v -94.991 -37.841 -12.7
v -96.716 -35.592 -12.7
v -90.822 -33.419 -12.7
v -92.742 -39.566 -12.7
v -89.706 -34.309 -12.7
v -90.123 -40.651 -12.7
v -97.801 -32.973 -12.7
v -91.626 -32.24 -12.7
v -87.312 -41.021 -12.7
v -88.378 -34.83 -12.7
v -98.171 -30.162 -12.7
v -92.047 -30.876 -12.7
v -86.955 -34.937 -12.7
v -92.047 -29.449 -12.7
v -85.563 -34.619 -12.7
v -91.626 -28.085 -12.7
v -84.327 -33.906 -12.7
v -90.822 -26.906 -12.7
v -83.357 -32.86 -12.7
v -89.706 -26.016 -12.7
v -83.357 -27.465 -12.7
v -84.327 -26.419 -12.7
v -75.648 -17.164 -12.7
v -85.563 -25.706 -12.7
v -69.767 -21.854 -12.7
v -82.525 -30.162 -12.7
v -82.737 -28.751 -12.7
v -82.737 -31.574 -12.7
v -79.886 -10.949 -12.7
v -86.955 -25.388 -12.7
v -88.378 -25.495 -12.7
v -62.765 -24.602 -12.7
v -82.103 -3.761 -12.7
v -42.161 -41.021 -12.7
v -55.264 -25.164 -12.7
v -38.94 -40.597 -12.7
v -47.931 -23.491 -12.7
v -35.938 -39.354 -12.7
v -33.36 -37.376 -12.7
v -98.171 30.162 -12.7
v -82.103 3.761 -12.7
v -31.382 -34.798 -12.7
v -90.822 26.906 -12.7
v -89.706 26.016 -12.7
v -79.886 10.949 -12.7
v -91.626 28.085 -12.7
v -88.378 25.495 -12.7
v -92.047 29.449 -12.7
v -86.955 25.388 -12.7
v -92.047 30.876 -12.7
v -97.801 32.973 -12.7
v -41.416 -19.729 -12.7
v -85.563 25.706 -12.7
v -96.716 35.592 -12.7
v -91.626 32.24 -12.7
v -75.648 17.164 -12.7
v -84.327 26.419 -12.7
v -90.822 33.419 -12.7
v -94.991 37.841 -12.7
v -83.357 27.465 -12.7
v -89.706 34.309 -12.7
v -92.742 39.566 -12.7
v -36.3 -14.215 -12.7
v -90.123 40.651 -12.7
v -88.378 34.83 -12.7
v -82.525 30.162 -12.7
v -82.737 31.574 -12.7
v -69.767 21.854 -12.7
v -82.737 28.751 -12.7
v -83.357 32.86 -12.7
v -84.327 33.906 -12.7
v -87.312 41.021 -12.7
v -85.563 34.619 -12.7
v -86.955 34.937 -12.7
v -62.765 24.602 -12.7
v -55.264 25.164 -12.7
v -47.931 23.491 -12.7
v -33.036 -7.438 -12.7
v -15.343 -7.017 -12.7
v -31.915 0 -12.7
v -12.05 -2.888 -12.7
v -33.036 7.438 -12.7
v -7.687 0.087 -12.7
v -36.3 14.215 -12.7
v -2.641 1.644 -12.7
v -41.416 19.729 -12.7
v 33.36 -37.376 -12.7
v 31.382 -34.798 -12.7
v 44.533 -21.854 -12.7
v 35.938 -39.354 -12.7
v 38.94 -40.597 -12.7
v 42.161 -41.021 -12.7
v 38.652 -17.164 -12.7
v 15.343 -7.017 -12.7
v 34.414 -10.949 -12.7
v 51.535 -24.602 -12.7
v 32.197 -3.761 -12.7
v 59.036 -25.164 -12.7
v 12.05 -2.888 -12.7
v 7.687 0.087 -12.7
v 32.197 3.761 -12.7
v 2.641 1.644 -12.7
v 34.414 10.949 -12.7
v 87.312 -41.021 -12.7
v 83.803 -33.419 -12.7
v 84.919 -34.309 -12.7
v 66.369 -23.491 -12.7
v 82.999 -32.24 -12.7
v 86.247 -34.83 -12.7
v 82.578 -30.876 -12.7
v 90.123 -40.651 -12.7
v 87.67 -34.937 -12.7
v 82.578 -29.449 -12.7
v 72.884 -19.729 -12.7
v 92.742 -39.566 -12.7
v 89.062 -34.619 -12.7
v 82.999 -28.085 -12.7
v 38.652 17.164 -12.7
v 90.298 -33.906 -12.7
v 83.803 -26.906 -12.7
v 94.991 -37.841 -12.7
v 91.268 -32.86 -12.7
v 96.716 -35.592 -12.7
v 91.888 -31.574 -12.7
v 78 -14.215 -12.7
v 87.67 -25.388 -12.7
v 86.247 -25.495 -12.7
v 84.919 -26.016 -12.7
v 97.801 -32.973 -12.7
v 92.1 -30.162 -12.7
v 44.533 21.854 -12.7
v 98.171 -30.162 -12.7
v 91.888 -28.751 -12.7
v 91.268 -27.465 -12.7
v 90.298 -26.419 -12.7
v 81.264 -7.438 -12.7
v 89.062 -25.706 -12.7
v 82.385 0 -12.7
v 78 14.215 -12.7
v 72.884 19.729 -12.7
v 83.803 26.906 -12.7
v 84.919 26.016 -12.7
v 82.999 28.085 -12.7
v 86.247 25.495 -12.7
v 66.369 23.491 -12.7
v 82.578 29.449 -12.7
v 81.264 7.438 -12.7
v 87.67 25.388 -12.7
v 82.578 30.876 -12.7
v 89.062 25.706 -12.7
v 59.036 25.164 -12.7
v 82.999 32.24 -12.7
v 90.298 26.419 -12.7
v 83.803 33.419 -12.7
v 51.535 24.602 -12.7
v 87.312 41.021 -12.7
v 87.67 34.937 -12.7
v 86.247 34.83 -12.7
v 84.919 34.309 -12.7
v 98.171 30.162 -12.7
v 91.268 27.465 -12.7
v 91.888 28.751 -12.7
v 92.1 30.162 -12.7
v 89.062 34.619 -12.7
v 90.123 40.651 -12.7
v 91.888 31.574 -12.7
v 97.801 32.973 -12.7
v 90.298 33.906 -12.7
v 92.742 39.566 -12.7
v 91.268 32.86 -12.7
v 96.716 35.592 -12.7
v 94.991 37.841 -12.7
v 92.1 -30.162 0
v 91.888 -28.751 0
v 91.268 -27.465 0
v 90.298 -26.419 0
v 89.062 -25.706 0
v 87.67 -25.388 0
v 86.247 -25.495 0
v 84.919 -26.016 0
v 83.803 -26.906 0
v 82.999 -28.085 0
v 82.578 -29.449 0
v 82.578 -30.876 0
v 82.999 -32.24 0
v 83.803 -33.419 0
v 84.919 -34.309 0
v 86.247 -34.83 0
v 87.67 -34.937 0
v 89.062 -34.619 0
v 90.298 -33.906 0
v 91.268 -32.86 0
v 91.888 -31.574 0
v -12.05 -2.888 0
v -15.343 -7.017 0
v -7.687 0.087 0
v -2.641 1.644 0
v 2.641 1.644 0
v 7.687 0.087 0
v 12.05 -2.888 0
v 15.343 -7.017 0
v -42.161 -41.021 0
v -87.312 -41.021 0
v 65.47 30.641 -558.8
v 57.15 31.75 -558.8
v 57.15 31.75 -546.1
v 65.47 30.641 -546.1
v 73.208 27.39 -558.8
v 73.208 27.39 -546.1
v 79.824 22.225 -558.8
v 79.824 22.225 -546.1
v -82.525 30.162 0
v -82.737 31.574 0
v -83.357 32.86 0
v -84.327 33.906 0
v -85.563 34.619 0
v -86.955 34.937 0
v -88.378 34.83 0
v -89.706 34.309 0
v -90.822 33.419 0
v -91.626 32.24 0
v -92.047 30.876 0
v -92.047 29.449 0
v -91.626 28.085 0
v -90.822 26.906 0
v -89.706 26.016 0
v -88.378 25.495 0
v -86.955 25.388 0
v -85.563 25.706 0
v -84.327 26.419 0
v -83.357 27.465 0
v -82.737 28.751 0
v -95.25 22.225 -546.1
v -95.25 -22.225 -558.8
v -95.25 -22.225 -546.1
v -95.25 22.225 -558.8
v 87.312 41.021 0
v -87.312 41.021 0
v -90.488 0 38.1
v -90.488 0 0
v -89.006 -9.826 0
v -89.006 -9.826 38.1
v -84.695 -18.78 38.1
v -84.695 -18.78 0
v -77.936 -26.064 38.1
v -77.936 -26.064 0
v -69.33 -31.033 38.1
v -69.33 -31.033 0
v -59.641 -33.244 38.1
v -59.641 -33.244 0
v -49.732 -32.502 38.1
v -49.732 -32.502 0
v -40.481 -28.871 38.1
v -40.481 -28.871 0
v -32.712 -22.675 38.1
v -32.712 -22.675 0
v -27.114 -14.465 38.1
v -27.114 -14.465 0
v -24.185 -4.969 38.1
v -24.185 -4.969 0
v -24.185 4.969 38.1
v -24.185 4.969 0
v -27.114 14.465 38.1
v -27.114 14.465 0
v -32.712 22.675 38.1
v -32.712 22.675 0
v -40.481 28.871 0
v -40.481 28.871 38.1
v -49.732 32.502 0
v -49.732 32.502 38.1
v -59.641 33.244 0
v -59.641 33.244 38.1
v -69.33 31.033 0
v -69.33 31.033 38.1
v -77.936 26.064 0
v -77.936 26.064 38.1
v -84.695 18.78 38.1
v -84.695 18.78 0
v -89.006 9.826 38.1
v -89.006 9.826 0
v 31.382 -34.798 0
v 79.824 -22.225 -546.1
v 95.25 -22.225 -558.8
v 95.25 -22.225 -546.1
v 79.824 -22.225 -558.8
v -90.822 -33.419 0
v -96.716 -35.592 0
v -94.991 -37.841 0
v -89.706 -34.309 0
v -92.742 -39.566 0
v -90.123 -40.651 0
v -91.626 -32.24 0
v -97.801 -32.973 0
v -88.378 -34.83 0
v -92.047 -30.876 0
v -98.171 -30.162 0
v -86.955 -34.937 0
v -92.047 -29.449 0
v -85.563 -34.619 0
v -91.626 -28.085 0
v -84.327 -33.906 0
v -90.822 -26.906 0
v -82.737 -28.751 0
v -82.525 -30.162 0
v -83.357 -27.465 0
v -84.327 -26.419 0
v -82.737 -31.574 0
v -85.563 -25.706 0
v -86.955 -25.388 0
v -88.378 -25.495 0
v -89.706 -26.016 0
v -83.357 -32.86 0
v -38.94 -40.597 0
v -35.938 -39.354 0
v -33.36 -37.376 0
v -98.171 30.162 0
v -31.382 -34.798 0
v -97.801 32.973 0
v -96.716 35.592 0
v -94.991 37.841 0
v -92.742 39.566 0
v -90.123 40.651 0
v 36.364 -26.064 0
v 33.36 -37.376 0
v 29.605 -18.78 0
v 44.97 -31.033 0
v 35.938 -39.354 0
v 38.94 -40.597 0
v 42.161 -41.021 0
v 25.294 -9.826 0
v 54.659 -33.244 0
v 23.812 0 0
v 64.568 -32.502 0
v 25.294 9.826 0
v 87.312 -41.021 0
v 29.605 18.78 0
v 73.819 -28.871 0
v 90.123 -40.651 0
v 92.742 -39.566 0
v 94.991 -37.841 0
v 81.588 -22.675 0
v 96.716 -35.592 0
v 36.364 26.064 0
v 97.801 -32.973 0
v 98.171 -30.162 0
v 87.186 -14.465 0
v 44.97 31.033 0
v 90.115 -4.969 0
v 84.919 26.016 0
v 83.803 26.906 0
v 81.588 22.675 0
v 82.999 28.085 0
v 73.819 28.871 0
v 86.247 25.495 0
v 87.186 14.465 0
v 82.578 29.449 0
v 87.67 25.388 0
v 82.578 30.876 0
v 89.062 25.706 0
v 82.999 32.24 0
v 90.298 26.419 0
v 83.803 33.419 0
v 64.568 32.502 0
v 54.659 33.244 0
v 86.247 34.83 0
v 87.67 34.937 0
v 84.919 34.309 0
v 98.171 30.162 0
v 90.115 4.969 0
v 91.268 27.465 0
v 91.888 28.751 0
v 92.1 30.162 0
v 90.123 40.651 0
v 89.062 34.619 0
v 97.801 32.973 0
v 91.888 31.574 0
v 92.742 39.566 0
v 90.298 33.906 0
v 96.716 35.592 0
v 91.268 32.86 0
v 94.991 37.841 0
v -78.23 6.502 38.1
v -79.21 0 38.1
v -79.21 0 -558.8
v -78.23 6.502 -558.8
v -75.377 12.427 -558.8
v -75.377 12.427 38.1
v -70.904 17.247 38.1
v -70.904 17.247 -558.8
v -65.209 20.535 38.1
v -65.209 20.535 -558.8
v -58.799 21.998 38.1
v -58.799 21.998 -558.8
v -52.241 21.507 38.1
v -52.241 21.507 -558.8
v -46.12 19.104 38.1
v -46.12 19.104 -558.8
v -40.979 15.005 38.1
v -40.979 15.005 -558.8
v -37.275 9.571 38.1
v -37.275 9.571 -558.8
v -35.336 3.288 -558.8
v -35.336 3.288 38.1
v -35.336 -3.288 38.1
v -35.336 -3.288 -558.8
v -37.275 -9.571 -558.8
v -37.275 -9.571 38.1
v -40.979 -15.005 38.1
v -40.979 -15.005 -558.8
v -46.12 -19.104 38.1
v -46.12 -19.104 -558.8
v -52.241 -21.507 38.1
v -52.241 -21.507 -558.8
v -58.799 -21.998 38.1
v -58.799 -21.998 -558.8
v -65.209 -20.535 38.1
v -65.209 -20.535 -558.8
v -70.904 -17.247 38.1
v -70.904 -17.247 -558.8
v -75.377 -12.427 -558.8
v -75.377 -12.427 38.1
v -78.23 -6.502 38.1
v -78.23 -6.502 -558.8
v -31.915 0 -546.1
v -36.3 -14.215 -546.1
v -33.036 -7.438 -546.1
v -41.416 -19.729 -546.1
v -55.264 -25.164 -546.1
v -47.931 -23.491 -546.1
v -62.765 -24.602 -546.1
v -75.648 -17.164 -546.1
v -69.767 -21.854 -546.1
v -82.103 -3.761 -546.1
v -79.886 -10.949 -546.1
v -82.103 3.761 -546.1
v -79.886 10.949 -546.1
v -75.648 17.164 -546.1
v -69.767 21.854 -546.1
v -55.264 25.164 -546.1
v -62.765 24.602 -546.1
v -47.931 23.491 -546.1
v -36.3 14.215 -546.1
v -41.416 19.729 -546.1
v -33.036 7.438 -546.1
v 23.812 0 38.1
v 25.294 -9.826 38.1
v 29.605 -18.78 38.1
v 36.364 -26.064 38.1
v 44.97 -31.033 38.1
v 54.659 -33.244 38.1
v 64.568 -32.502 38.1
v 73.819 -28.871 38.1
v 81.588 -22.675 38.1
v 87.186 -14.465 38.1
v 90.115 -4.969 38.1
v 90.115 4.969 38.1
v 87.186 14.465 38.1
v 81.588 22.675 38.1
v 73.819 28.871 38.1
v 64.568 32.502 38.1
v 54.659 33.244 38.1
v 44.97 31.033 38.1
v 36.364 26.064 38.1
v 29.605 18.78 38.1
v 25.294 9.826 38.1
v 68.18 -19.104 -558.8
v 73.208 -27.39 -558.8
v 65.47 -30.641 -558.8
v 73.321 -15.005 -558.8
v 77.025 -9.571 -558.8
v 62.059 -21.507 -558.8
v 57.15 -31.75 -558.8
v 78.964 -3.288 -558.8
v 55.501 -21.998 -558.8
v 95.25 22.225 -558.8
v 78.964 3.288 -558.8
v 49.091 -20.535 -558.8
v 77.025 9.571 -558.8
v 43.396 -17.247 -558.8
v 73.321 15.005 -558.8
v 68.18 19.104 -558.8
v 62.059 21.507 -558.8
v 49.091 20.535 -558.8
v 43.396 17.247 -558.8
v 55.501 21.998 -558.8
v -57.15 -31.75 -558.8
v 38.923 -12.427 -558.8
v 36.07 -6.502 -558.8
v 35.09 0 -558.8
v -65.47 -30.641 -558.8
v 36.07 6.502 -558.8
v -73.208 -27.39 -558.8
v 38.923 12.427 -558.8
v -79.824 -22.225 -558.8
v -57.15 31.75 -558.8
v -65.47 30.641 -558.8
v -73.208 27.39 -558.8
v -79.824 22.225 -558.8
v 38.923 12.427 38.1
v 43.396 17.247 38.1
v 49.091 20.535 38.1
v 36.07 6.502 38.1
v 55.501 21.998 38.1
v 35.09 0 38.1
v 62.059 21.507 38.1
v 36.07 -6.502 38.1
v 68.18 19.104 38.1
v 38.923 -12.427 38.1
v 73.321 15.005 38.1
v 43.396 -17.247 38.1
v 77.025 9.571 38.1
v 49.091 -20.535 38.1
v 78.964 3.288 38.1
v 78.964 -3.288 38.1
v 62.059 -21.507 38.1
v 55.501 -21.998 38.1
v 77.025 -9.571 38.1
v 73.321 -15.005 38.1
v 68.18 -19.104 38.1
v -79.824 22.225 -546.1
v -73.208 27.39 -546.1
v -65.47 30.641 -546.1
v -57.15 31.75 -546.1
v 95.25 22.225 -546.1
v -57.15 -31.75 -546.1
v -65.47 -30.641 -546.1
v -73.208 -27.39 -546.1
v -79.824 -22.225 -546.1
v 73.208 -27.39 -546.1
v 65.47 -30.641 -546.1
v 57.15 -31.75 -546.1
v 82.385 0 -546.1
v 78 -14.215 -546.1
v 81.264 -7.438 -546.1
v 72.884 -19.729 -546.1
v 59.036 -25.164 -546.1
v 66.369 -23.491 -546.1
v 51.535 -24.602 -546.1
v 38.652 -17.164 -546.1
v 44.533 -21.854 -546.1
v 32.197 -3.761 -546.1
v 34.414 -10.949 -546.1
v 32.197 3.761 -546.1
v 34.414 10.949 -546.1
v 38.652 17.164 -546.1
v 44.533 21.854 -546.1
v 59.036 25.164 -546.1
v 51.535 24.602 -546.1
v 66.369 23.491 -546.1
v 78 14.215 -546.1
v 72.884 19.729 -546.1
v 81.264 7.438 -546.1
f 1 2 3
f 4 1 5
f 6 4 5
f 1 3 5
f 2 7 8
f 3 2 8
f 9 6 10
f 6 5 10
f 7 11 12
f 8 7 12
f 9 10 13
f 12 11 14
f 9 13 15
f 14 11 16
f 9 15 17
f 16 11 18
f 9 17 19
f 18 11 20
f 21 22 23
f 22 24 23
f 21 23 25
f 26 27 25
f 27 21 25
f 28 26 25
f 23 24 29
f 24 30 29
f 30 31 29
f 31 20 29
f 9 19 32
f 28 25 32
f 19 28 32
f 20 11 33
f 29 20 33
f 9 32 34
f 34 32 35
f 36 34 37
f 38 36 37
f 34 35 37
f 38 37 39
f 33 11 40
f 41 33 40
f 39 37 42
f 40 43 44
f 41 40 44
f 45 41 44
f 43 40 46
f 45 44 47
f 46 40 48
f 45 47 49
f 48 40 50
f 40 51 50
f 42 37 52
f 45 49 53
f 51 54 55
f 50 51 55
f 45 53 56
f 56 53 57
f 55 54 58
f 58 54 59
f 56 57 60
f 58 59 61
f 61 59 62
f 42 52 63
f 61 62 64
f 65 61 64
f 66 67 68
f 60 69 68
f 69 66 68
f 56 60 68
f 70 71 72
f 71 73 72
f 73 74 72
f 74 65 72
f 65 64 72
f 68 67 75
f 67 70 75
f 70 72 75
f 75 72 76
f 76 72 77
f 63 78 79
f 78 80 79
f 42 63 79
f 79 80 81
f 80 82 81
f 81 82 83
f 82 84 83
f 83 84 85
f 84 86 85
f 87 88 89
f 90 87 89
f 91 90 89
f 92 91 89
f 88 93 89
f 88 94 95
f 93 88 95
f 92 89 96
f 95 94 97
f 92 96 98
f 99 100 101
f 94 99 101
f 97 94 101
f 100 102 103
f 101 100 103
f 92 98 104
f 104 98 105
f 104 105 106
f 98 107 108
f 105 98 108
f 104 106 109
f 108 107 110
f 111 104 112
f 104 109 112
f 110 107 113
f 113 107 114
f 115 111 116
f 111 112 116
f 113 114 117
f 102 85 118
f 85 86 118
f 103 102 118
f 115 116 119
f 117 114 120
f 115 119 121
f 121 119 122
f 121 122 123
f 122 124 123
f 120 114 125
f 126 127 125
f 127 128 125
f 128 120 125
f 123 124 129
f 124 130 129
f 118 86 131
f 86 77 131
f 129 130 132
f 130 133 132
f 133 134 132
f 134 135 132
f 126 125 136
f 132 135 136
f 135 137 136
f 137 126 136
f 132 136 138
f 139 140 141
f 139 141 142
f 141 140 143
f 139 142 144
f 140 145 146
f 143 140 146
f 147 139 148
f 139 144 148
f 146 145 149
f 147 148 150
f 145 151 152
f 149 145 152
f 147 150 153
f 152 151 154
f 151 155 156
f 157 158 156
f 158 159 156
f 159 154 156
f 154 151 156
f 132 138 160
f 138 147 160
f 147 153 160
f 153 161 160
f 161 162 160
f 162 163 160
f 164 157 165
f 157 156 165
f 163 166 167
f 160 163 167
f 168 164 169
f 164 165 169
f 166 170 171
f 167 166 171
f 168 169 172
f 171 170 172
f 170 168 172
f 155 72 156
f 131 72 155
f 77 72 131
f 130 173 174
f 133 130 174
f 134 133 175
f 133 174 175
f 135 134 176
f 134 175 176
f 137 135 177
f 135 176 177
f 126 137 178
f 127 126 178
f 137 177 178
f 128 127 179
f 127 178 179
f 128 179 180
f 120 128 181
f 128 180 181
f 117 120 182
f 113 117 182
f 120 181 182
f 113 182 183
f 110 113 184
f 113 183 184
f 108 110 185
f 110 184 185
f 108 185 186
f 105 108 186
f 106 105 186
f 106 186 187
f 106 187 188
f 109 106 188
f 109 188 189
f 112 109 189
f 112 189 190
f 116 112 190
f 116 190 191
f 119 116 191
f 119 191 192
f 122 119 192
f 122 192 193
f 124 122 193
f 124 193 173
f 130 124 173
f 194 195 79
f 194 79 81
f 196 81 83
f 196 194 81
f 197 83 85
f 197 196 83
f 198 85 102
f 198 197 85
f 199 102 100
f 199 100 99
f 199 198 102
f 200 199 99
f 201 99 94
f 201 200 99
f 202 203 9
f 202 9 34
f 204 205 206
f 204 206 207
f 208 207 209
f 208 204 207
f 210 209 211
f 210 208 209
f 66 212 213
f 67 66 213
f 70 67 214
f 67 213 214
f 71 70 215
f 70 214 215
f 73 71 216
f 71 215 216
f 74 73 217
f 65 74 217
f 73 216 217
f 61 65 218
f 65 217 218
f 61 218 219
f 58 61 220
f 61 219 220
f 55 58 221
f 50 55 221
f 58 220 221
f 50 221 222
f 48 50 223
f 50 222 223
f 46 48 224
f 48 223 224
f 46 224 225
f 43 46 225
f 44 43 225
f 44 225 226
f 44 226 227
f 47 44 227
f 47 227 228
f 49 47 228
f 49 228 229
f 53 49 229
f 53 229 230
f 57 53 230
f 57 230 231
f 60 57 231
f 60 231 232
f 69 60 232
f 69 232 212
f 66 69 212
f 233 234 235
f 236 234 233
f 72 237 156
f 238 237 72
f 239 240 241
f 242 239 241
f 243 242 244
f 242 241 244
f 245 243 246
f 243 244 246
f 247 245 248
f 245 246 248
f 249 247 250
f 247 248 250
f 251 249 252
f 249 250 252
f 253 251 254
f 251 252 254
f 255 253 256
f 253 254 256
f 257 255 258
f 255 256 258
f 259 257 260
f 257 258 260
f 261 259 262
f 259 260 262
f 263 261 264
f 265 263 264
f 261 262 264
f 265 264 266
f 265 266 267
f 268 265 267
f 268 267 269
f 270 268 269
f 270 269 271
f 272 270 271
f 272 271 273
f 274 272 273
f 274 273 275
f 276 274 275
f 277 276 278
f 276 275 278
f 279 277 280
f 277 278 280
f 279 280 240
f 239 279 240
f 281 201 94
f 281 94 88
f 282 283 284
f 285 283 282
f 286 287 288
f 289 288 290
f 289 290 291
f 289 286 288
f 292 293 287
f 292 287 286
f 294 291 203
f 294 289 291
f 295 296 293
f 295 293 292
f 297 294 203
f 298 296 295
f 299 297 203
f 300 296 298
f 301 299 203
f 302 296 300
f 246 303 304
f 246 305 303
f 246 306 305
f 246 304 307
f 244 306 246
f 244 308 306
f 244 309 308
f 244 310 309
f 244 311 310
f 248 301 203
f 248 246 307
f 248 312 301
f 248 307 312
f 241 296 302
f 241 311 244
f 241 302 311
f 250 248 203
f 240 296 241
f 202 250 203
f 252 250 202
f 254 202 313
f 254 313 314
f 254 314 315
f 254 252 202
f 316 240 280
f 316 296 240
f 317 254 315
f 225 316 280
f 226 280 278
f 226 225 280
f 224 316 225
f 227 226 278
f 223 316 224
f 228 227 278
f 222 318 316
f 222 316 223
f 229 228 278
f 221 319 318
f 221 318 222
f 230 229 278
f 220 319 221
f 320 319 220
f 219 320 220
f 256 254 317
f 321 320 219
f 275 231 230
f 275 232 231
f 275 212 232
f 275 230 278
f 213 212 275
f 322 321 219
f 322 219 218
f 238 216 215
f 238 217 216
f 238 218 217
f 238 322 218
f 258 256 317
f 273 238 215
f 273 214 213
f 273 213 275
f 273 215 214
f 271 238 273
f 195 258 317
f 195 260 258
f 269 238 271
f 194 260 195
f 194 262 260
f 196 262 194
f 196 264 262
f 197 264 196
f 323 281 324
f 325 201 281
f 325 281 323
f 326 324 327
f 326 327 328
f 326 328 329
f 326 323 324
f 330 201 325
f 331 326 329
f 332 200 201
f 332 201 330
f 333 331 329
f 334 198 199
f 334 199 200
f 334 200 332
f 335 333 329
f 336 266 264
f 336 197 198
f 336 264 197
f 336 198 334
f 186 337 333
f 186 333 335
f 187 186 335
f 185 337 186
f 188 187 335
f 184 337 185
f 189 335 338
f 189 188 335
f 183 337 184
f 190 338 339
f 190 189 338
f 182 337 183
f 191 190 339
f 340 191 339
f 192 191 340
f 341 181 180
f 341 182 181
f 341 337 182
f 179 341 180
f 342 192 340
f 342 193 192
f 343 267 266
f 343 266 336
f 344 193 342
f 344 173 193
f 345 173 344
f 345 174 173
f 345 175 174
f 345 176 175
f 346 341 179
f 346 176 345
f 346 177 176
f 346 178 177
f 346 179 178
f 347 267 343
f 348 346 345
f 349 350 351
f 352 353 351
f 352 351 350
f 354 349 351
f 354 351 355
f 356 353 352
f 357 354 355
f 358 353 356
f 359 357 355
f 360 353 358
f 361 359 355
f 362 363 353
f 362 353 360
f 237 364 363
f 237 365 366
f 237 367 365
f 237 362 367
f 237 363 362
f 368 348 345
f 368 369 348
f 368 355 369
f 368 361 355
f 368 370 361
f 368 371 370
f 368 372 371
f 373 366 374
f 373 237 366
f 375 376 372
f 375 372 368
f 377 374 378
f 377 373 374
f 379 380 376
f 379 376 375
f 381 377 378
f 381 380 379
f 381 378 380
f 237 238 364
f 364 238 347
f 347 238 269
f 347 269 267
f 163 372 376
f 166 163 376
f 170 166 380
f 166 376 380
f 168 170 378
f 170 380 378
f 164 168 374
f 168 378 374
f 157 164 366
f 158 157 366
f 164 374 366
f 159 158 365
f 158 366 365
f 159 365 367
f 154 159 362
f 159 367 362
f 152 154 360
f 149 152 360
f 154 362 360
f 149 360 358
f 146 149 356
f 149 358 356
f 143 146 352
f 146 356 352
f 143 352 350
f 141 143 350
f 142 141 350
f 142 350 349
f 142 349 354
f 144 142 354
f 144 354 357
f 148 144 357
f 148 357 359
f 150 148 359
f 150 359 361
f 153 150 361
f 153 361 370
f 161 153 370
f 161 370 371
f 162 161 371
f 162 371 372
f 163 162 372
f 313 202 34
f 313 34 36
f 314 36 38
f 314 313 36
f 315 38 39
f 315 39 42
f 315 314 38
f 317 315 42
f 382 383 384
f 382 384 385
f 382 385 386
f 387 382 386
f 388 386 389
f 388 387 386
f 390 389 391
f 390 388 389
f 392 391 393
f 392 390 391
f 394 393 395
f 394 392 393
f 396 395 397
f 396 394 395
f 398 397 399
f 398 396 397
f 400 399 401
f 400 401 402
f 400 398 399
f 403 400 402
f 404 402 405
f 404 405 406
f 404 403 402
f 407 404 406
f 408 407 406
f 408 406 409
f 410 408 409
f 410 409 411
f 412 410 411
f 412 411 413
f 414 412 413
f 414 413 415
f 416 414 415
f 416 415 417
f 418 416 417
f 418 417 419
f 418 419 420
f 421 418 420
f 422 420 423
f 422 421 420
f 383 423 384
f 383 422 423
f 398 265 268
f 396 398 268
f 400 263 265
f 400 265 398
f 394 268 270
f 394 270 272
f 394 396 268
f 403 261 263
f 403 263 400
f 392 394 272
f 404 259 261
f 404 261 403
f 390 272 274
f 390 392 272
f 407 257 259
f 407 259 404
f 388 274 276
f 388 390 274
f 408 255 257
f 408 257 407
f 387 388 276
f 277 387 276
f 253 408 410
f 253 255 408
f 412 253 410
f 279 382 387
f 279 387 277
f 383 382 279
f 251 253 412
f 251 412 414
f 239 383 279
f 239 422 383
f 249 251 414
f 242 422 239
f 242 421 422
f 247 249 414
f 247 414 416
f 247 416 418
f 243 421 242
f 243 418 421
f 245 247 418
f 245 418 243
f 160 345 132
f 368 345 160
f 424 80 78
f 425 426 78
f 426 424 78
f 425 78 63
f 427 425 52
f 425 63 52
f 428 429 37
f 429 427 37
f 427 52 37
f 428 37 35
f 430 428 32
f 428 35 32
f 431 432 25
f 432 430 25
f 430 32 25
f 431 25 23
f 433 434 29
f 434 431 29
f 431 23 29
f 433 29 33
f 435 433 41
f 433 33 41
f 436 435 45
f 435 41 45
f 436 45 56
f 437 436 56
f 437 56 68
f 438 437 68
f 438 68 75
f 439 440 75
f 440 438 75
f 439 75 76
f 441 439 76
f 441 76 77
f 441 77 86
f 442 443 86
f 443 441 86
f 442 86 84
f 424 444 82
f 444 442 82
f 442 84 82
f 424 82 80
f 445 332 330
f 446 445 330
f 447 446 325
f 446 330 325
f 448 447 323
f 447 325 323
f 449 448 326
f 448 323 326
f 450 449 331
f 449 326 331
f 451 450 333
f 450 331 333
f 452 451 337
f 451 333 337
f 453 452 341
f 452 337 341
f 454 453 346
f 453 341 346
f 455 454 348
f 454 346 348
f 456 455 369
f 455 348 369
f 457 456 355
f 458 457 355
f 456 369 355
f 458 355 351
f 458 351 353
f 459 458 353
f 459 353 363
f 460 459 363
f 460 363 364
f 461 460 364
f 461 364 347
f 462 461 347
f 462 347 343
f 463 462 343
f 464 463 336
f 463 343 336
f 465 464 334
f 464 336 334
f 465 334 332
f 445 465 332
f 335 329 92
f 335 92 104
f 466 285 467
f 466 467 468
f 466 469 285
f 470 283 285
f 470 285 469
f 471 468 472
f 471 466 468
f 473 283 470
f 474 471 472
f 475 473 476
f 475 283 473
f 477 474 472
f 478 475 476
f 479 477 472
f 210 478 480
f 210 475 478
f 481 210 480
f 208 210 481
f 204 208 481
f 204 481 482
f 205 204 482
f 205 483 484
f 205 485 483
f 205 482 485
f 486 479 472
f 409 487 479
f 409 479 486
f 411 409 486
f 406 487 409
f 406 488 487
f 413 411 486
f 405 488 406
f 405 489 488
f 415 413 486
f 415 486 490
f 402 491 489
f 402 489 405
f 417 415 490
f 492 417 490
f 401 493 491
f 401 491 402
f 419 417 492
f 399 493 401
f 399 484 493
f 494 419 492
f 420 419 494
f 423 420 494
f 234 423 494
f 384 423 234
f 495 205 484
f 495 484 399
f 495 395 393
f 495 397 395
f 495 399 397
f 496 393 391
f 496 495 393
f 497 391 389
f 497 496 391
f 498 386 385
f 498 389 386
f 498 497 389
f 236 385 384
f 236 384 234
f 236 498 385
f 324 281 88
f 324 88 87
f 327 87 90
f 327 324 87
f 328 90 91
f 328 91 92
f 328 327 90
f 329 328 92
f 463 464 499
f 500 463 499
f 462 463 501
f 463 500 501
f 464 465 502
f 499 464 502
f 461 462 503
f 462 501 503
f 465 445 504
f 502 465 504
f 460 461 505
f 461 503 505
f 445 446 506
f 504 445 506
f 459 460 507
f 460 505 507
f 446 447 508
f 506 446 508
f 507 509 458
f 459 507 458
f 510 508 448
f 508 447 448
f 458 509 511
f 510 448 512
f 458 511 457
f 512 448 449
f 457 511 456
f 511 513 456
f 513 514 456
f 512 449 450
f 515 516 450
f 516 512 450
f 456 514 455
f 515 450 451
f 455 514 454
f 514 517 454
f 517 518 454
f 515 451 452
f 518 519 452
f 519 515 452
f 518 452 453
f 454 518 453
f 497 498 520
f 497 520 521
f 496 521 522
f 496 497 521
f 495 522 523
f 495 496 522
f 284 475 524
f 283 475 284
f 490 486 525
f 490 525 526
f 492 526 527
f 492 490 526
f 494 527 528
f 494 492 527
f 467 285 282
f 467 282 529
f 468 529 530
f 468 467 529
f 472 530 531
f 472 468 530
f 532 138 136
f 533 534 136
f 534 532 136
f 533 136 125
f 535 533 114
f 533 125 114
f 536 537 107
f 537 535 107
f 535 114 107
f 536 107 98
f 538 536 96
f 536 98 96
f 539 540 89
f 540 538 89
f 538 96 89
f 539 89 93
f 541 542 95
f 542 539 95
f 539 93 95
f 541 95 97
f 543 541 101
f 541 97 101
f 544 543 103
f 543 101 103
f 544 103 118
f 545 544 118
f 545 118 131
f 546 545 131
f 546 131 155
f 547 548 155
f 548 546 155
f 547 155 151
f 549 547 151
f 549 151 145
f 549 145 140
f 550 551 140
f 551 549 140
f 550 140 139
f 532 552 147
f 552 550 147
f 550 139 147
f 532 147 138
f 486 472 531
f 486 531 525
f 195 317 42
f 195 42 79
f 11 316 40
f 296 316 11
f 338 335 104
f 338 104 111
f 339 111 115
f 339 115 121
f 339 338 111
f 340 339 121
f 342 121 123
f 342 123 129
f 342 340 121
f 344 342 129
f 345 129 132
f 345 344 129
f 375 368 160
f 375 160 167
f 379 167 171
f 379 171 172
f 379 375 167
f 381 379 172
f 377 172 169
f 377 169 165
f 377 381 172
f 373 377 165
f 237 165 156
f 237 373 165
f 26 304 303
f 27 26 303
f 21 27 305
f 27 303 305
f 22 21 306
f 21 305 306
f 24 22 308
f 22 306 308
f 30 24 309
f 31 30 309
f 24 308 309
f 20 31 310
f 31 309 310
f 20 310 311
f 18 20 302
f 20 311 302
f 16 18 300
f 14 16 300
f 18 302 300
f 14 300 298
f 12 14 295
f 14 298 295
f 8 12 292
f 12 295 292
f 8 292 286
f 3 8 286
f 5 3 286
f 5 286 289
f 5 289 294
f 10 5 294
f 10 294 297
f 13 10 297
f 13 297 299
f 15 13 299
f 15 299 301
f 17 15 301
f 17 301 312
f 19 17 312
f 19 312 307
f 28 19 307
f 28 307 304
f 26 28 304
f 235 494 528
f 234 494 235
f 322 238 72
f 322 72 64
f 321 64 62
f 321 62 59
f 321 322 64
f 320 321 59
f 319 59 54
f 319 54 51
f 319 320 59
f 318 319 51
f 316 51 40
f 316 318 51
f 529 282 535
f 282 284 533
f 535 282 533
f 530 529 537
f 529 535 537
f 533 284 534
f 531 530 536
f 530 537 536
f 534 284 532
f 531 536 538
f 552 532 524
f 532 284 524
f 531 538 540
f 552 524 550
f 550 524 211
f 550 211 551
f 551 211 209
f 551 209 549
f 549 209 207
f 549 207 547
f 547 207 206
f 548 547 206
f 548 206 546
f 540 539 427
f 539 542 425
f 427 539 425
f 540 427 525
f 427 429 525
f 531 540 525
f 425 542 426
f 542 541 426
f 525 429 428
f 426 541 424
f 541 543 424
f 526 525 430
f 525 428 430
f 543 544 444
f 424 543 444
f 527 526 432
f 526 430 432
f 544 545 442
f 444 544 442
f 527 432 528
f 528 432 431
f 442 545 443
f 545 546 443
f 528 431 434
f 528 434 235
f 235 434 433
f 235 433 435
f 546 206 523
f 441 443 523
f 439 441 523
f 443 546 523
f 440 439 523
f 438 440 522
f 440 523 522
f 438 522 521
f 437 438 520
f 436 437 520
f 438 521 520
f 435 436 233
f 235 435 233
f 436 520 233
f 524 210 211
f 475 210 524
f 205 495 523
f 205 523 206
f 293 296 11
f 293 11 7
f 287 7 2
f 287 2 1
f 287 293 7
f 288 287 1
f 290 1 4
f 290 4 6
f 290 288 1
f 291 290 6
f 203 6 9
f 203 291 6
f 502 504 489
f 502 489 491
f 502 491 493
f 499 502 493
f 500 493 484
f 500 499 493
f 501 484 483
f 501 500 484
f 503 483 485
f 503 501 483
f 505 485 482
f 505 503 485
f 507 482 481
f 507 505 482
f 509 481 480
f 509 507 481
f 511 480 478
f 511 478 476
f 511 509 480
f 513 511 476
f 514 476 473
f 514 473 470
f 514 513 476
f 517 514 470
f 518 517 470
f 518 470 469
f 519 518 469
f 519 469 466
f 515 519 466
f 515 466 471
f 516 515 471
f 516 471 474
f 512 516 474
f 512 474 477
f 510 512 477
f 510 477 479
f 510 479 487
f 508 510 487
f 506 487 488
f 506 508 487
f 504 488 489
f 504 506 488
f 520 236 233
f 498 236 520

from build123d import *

# Parameters (mm, degrees)
EXTRUDE1_DEPTH      = 12.7
SKETCH27_R          = 33.3375
EXTRUDE3_DEPTH      = 38.1
SKETCH29_R          = 4.7879
SKETCH29_R_2        = 25.2349
CUT_EXTRUDE5_DEPTH  = 50.8
SKETCH41_R          = 25.2349
SKETCH41_R_2        = 22.0599
BOSS_EXTRUDE1_DEPTH = 596.9
SKETCH42_R          = 22.5679
BOSS_EXTRUDE2_DEPTH = 12.7


with BuildPart() as part:
    # Sketch1 → Extrude1 (new body)
    with BuildSketch(Plane.XY):
        with BuildLine():
            Line((-98.171, 30.1625), (-98.171, -30.1625))
            ThreePointArc((-98.171, -30.1625), (-94.990618984, -37.840618984), (-87.3125, -41.021))
            Line((-87.3125, -41.021), (-42.161003408, -41.021))
            ThreePointArc((-42.161003408, -41.021), (-35.938003408, -39.353552176), (-31.382451232, -34.798))
            Line((-31.382451232, -34.798), (-15.342939066, -7.01675))
            ThreePointArc((-15.342939066, -7.01675), (0, 1.8415), (15.342939066, -7.01675))
            Line((15.342939066, -7.01675), (31.382451232, -34.798))
            ThreePointArc((31.382451232, -34.798), (35.938003408, -39.353552176), (42.161003408, -41.021))
            Line((42.161003408, -41.021), (87.3125, -41.021))
            ThreePointArc((87.3125, -41.021), (94.990618984, -37.840618984), (98.171, -30.1625))
            Line((98.171, -30.1625), (98.171, 30.1625))
            ThreePointArc((98.171, 30.1625), (94.990618984, 37.840618984), (87.3125, 41.021))
            Line((87.3125, 41.021), (-87.3125, 41.021))
            ThreePointArc((-87.3125, 41.021), (-94.990618984, 37.840618984), (-98.171, 30.1625))
        make_face()
    extrude(amount=-EXTRUDE1_DEPTH)

    # Sketch27 → Extrude3 (add)
    with BuildSketch(Plane.XY):
        with Locations(Location((-57.15, 0, 0), (0, 0, 180))):
            Circle(SKETCH27_R)
        with Locations(Location((57.15, 0, 0), (0, 0, 180))):
            Circle(SKETCH27_R)
    extrude(amount=EXTRUDE3_DEPTH)

    # Sketch29 → Cut-Extrude5 (cut, symmetric)
    with BuildSketch(Plane.XY):
        with Locations((-87.3125, -30.1625)):
            Circle(SKETCH29_R)
        with Locations((87.3125, -30.1625)):
            Circle(SKETCH29_R)
        with Locations((87.3125, 30.1625)):
            Circle(SKETCH29_R)
        with Locations((-87.3125, 30.1625)):
            Circle(SKETCH29_R)
        with Locations((57.15, 0)):
            Circle(SKETCH29_R_2)
        with Locations((-57.15, 0)):
            Circle(SKETCH29_R_2)
    extrude(amount=CUT_EXTRUDE5_DEPTH, both=True, mode=Mode.SUBTRACT)

    # Sketch41 → Boss-Extrude1 (add)
    # profile 1 of 2: a face of its own
    with BuildSketch(Plane(origin=(0, 0, 38.1), x_dir=(-1, 0, 0), z_dir=(0, 0, -1))):
        with Locations(Location((-57.15, 0, 0), (0, 0, 180))):
            Circle(SKETCH41_R)
        with Locations((-57.15, 0)):
            Circle(SKETCH41_R_2, mode=Mode.SUBTRACT)
    # profile 2 of 2: a face of its own
    with BuildSketch(Plane(origin=(0, 0, 38.1), x_dir=(-1, 0, 0), z_dir=(0, 0, -1))):
        with Locations(Location((57.15, 0, 0), (0, 0, 180))):
            Circle(SKETCH41_R)
        with Locations((57.15, 0)):
            Circle(SKETCH41_R_2, mode=Mode.SUBTRACT)
    extrude(amount=BOSS_EXTRUDE1_DEPTH)

    # Sketch42 → Boss-Extrude2 (add)
    with BuildSketch(Plane(origin=(0, 0, -558.8), x_dir=(-1, 0, 0), z_dir=(0, 0, -1))):
        with BuildLine():
            Line((57.15, 31.75), (-57.15, 31.75))
            ThreePointArc((-57.15, 31.75), (-69.446722124, 29.272053652), (-79.824035261, 22.225))
            Line((-79.824035261, 22.225), (-95.25, 22.225))
            Line((-95.25, 22.225), (-95.25, -22.225))
            Line((-95.25, -22.225), (-79.824035261, -22.225))
            ThreePointArc((-79.824035261, -22.225), (-69.446722124, -29.272053652), (-57.15, -31.75))
            Line((-57.15, -31.75), (57.15, -31.75))
            ThreePointArc((57.15, -31.75), (69.446722124, -29.272053652), (79.824035261, -22.225))
            Line((79.824035261, -22.225), (95.25, -22.225))
            Line((95.25, -22.225), (95.25, 22.225))
            Line((95.25, 22.225), (79.824035261, 22.225))
            ThreePointArc((79.824035261, 22.225), (69.446722124, 29.272053652), (57.15, 31.75))
        make_face()
        with Locations((-57.15, 0)):
            Circle(SKETCH42_R, mode=Mode.SUBTRACT)
        with Locations((57.15, 0)):
            Circle(SKETCH42_R, mode=Mode.SUBTRACT)
    extrude(amount=-BOSS_EXTRUDE2_DEPTH)


solid = part.part
